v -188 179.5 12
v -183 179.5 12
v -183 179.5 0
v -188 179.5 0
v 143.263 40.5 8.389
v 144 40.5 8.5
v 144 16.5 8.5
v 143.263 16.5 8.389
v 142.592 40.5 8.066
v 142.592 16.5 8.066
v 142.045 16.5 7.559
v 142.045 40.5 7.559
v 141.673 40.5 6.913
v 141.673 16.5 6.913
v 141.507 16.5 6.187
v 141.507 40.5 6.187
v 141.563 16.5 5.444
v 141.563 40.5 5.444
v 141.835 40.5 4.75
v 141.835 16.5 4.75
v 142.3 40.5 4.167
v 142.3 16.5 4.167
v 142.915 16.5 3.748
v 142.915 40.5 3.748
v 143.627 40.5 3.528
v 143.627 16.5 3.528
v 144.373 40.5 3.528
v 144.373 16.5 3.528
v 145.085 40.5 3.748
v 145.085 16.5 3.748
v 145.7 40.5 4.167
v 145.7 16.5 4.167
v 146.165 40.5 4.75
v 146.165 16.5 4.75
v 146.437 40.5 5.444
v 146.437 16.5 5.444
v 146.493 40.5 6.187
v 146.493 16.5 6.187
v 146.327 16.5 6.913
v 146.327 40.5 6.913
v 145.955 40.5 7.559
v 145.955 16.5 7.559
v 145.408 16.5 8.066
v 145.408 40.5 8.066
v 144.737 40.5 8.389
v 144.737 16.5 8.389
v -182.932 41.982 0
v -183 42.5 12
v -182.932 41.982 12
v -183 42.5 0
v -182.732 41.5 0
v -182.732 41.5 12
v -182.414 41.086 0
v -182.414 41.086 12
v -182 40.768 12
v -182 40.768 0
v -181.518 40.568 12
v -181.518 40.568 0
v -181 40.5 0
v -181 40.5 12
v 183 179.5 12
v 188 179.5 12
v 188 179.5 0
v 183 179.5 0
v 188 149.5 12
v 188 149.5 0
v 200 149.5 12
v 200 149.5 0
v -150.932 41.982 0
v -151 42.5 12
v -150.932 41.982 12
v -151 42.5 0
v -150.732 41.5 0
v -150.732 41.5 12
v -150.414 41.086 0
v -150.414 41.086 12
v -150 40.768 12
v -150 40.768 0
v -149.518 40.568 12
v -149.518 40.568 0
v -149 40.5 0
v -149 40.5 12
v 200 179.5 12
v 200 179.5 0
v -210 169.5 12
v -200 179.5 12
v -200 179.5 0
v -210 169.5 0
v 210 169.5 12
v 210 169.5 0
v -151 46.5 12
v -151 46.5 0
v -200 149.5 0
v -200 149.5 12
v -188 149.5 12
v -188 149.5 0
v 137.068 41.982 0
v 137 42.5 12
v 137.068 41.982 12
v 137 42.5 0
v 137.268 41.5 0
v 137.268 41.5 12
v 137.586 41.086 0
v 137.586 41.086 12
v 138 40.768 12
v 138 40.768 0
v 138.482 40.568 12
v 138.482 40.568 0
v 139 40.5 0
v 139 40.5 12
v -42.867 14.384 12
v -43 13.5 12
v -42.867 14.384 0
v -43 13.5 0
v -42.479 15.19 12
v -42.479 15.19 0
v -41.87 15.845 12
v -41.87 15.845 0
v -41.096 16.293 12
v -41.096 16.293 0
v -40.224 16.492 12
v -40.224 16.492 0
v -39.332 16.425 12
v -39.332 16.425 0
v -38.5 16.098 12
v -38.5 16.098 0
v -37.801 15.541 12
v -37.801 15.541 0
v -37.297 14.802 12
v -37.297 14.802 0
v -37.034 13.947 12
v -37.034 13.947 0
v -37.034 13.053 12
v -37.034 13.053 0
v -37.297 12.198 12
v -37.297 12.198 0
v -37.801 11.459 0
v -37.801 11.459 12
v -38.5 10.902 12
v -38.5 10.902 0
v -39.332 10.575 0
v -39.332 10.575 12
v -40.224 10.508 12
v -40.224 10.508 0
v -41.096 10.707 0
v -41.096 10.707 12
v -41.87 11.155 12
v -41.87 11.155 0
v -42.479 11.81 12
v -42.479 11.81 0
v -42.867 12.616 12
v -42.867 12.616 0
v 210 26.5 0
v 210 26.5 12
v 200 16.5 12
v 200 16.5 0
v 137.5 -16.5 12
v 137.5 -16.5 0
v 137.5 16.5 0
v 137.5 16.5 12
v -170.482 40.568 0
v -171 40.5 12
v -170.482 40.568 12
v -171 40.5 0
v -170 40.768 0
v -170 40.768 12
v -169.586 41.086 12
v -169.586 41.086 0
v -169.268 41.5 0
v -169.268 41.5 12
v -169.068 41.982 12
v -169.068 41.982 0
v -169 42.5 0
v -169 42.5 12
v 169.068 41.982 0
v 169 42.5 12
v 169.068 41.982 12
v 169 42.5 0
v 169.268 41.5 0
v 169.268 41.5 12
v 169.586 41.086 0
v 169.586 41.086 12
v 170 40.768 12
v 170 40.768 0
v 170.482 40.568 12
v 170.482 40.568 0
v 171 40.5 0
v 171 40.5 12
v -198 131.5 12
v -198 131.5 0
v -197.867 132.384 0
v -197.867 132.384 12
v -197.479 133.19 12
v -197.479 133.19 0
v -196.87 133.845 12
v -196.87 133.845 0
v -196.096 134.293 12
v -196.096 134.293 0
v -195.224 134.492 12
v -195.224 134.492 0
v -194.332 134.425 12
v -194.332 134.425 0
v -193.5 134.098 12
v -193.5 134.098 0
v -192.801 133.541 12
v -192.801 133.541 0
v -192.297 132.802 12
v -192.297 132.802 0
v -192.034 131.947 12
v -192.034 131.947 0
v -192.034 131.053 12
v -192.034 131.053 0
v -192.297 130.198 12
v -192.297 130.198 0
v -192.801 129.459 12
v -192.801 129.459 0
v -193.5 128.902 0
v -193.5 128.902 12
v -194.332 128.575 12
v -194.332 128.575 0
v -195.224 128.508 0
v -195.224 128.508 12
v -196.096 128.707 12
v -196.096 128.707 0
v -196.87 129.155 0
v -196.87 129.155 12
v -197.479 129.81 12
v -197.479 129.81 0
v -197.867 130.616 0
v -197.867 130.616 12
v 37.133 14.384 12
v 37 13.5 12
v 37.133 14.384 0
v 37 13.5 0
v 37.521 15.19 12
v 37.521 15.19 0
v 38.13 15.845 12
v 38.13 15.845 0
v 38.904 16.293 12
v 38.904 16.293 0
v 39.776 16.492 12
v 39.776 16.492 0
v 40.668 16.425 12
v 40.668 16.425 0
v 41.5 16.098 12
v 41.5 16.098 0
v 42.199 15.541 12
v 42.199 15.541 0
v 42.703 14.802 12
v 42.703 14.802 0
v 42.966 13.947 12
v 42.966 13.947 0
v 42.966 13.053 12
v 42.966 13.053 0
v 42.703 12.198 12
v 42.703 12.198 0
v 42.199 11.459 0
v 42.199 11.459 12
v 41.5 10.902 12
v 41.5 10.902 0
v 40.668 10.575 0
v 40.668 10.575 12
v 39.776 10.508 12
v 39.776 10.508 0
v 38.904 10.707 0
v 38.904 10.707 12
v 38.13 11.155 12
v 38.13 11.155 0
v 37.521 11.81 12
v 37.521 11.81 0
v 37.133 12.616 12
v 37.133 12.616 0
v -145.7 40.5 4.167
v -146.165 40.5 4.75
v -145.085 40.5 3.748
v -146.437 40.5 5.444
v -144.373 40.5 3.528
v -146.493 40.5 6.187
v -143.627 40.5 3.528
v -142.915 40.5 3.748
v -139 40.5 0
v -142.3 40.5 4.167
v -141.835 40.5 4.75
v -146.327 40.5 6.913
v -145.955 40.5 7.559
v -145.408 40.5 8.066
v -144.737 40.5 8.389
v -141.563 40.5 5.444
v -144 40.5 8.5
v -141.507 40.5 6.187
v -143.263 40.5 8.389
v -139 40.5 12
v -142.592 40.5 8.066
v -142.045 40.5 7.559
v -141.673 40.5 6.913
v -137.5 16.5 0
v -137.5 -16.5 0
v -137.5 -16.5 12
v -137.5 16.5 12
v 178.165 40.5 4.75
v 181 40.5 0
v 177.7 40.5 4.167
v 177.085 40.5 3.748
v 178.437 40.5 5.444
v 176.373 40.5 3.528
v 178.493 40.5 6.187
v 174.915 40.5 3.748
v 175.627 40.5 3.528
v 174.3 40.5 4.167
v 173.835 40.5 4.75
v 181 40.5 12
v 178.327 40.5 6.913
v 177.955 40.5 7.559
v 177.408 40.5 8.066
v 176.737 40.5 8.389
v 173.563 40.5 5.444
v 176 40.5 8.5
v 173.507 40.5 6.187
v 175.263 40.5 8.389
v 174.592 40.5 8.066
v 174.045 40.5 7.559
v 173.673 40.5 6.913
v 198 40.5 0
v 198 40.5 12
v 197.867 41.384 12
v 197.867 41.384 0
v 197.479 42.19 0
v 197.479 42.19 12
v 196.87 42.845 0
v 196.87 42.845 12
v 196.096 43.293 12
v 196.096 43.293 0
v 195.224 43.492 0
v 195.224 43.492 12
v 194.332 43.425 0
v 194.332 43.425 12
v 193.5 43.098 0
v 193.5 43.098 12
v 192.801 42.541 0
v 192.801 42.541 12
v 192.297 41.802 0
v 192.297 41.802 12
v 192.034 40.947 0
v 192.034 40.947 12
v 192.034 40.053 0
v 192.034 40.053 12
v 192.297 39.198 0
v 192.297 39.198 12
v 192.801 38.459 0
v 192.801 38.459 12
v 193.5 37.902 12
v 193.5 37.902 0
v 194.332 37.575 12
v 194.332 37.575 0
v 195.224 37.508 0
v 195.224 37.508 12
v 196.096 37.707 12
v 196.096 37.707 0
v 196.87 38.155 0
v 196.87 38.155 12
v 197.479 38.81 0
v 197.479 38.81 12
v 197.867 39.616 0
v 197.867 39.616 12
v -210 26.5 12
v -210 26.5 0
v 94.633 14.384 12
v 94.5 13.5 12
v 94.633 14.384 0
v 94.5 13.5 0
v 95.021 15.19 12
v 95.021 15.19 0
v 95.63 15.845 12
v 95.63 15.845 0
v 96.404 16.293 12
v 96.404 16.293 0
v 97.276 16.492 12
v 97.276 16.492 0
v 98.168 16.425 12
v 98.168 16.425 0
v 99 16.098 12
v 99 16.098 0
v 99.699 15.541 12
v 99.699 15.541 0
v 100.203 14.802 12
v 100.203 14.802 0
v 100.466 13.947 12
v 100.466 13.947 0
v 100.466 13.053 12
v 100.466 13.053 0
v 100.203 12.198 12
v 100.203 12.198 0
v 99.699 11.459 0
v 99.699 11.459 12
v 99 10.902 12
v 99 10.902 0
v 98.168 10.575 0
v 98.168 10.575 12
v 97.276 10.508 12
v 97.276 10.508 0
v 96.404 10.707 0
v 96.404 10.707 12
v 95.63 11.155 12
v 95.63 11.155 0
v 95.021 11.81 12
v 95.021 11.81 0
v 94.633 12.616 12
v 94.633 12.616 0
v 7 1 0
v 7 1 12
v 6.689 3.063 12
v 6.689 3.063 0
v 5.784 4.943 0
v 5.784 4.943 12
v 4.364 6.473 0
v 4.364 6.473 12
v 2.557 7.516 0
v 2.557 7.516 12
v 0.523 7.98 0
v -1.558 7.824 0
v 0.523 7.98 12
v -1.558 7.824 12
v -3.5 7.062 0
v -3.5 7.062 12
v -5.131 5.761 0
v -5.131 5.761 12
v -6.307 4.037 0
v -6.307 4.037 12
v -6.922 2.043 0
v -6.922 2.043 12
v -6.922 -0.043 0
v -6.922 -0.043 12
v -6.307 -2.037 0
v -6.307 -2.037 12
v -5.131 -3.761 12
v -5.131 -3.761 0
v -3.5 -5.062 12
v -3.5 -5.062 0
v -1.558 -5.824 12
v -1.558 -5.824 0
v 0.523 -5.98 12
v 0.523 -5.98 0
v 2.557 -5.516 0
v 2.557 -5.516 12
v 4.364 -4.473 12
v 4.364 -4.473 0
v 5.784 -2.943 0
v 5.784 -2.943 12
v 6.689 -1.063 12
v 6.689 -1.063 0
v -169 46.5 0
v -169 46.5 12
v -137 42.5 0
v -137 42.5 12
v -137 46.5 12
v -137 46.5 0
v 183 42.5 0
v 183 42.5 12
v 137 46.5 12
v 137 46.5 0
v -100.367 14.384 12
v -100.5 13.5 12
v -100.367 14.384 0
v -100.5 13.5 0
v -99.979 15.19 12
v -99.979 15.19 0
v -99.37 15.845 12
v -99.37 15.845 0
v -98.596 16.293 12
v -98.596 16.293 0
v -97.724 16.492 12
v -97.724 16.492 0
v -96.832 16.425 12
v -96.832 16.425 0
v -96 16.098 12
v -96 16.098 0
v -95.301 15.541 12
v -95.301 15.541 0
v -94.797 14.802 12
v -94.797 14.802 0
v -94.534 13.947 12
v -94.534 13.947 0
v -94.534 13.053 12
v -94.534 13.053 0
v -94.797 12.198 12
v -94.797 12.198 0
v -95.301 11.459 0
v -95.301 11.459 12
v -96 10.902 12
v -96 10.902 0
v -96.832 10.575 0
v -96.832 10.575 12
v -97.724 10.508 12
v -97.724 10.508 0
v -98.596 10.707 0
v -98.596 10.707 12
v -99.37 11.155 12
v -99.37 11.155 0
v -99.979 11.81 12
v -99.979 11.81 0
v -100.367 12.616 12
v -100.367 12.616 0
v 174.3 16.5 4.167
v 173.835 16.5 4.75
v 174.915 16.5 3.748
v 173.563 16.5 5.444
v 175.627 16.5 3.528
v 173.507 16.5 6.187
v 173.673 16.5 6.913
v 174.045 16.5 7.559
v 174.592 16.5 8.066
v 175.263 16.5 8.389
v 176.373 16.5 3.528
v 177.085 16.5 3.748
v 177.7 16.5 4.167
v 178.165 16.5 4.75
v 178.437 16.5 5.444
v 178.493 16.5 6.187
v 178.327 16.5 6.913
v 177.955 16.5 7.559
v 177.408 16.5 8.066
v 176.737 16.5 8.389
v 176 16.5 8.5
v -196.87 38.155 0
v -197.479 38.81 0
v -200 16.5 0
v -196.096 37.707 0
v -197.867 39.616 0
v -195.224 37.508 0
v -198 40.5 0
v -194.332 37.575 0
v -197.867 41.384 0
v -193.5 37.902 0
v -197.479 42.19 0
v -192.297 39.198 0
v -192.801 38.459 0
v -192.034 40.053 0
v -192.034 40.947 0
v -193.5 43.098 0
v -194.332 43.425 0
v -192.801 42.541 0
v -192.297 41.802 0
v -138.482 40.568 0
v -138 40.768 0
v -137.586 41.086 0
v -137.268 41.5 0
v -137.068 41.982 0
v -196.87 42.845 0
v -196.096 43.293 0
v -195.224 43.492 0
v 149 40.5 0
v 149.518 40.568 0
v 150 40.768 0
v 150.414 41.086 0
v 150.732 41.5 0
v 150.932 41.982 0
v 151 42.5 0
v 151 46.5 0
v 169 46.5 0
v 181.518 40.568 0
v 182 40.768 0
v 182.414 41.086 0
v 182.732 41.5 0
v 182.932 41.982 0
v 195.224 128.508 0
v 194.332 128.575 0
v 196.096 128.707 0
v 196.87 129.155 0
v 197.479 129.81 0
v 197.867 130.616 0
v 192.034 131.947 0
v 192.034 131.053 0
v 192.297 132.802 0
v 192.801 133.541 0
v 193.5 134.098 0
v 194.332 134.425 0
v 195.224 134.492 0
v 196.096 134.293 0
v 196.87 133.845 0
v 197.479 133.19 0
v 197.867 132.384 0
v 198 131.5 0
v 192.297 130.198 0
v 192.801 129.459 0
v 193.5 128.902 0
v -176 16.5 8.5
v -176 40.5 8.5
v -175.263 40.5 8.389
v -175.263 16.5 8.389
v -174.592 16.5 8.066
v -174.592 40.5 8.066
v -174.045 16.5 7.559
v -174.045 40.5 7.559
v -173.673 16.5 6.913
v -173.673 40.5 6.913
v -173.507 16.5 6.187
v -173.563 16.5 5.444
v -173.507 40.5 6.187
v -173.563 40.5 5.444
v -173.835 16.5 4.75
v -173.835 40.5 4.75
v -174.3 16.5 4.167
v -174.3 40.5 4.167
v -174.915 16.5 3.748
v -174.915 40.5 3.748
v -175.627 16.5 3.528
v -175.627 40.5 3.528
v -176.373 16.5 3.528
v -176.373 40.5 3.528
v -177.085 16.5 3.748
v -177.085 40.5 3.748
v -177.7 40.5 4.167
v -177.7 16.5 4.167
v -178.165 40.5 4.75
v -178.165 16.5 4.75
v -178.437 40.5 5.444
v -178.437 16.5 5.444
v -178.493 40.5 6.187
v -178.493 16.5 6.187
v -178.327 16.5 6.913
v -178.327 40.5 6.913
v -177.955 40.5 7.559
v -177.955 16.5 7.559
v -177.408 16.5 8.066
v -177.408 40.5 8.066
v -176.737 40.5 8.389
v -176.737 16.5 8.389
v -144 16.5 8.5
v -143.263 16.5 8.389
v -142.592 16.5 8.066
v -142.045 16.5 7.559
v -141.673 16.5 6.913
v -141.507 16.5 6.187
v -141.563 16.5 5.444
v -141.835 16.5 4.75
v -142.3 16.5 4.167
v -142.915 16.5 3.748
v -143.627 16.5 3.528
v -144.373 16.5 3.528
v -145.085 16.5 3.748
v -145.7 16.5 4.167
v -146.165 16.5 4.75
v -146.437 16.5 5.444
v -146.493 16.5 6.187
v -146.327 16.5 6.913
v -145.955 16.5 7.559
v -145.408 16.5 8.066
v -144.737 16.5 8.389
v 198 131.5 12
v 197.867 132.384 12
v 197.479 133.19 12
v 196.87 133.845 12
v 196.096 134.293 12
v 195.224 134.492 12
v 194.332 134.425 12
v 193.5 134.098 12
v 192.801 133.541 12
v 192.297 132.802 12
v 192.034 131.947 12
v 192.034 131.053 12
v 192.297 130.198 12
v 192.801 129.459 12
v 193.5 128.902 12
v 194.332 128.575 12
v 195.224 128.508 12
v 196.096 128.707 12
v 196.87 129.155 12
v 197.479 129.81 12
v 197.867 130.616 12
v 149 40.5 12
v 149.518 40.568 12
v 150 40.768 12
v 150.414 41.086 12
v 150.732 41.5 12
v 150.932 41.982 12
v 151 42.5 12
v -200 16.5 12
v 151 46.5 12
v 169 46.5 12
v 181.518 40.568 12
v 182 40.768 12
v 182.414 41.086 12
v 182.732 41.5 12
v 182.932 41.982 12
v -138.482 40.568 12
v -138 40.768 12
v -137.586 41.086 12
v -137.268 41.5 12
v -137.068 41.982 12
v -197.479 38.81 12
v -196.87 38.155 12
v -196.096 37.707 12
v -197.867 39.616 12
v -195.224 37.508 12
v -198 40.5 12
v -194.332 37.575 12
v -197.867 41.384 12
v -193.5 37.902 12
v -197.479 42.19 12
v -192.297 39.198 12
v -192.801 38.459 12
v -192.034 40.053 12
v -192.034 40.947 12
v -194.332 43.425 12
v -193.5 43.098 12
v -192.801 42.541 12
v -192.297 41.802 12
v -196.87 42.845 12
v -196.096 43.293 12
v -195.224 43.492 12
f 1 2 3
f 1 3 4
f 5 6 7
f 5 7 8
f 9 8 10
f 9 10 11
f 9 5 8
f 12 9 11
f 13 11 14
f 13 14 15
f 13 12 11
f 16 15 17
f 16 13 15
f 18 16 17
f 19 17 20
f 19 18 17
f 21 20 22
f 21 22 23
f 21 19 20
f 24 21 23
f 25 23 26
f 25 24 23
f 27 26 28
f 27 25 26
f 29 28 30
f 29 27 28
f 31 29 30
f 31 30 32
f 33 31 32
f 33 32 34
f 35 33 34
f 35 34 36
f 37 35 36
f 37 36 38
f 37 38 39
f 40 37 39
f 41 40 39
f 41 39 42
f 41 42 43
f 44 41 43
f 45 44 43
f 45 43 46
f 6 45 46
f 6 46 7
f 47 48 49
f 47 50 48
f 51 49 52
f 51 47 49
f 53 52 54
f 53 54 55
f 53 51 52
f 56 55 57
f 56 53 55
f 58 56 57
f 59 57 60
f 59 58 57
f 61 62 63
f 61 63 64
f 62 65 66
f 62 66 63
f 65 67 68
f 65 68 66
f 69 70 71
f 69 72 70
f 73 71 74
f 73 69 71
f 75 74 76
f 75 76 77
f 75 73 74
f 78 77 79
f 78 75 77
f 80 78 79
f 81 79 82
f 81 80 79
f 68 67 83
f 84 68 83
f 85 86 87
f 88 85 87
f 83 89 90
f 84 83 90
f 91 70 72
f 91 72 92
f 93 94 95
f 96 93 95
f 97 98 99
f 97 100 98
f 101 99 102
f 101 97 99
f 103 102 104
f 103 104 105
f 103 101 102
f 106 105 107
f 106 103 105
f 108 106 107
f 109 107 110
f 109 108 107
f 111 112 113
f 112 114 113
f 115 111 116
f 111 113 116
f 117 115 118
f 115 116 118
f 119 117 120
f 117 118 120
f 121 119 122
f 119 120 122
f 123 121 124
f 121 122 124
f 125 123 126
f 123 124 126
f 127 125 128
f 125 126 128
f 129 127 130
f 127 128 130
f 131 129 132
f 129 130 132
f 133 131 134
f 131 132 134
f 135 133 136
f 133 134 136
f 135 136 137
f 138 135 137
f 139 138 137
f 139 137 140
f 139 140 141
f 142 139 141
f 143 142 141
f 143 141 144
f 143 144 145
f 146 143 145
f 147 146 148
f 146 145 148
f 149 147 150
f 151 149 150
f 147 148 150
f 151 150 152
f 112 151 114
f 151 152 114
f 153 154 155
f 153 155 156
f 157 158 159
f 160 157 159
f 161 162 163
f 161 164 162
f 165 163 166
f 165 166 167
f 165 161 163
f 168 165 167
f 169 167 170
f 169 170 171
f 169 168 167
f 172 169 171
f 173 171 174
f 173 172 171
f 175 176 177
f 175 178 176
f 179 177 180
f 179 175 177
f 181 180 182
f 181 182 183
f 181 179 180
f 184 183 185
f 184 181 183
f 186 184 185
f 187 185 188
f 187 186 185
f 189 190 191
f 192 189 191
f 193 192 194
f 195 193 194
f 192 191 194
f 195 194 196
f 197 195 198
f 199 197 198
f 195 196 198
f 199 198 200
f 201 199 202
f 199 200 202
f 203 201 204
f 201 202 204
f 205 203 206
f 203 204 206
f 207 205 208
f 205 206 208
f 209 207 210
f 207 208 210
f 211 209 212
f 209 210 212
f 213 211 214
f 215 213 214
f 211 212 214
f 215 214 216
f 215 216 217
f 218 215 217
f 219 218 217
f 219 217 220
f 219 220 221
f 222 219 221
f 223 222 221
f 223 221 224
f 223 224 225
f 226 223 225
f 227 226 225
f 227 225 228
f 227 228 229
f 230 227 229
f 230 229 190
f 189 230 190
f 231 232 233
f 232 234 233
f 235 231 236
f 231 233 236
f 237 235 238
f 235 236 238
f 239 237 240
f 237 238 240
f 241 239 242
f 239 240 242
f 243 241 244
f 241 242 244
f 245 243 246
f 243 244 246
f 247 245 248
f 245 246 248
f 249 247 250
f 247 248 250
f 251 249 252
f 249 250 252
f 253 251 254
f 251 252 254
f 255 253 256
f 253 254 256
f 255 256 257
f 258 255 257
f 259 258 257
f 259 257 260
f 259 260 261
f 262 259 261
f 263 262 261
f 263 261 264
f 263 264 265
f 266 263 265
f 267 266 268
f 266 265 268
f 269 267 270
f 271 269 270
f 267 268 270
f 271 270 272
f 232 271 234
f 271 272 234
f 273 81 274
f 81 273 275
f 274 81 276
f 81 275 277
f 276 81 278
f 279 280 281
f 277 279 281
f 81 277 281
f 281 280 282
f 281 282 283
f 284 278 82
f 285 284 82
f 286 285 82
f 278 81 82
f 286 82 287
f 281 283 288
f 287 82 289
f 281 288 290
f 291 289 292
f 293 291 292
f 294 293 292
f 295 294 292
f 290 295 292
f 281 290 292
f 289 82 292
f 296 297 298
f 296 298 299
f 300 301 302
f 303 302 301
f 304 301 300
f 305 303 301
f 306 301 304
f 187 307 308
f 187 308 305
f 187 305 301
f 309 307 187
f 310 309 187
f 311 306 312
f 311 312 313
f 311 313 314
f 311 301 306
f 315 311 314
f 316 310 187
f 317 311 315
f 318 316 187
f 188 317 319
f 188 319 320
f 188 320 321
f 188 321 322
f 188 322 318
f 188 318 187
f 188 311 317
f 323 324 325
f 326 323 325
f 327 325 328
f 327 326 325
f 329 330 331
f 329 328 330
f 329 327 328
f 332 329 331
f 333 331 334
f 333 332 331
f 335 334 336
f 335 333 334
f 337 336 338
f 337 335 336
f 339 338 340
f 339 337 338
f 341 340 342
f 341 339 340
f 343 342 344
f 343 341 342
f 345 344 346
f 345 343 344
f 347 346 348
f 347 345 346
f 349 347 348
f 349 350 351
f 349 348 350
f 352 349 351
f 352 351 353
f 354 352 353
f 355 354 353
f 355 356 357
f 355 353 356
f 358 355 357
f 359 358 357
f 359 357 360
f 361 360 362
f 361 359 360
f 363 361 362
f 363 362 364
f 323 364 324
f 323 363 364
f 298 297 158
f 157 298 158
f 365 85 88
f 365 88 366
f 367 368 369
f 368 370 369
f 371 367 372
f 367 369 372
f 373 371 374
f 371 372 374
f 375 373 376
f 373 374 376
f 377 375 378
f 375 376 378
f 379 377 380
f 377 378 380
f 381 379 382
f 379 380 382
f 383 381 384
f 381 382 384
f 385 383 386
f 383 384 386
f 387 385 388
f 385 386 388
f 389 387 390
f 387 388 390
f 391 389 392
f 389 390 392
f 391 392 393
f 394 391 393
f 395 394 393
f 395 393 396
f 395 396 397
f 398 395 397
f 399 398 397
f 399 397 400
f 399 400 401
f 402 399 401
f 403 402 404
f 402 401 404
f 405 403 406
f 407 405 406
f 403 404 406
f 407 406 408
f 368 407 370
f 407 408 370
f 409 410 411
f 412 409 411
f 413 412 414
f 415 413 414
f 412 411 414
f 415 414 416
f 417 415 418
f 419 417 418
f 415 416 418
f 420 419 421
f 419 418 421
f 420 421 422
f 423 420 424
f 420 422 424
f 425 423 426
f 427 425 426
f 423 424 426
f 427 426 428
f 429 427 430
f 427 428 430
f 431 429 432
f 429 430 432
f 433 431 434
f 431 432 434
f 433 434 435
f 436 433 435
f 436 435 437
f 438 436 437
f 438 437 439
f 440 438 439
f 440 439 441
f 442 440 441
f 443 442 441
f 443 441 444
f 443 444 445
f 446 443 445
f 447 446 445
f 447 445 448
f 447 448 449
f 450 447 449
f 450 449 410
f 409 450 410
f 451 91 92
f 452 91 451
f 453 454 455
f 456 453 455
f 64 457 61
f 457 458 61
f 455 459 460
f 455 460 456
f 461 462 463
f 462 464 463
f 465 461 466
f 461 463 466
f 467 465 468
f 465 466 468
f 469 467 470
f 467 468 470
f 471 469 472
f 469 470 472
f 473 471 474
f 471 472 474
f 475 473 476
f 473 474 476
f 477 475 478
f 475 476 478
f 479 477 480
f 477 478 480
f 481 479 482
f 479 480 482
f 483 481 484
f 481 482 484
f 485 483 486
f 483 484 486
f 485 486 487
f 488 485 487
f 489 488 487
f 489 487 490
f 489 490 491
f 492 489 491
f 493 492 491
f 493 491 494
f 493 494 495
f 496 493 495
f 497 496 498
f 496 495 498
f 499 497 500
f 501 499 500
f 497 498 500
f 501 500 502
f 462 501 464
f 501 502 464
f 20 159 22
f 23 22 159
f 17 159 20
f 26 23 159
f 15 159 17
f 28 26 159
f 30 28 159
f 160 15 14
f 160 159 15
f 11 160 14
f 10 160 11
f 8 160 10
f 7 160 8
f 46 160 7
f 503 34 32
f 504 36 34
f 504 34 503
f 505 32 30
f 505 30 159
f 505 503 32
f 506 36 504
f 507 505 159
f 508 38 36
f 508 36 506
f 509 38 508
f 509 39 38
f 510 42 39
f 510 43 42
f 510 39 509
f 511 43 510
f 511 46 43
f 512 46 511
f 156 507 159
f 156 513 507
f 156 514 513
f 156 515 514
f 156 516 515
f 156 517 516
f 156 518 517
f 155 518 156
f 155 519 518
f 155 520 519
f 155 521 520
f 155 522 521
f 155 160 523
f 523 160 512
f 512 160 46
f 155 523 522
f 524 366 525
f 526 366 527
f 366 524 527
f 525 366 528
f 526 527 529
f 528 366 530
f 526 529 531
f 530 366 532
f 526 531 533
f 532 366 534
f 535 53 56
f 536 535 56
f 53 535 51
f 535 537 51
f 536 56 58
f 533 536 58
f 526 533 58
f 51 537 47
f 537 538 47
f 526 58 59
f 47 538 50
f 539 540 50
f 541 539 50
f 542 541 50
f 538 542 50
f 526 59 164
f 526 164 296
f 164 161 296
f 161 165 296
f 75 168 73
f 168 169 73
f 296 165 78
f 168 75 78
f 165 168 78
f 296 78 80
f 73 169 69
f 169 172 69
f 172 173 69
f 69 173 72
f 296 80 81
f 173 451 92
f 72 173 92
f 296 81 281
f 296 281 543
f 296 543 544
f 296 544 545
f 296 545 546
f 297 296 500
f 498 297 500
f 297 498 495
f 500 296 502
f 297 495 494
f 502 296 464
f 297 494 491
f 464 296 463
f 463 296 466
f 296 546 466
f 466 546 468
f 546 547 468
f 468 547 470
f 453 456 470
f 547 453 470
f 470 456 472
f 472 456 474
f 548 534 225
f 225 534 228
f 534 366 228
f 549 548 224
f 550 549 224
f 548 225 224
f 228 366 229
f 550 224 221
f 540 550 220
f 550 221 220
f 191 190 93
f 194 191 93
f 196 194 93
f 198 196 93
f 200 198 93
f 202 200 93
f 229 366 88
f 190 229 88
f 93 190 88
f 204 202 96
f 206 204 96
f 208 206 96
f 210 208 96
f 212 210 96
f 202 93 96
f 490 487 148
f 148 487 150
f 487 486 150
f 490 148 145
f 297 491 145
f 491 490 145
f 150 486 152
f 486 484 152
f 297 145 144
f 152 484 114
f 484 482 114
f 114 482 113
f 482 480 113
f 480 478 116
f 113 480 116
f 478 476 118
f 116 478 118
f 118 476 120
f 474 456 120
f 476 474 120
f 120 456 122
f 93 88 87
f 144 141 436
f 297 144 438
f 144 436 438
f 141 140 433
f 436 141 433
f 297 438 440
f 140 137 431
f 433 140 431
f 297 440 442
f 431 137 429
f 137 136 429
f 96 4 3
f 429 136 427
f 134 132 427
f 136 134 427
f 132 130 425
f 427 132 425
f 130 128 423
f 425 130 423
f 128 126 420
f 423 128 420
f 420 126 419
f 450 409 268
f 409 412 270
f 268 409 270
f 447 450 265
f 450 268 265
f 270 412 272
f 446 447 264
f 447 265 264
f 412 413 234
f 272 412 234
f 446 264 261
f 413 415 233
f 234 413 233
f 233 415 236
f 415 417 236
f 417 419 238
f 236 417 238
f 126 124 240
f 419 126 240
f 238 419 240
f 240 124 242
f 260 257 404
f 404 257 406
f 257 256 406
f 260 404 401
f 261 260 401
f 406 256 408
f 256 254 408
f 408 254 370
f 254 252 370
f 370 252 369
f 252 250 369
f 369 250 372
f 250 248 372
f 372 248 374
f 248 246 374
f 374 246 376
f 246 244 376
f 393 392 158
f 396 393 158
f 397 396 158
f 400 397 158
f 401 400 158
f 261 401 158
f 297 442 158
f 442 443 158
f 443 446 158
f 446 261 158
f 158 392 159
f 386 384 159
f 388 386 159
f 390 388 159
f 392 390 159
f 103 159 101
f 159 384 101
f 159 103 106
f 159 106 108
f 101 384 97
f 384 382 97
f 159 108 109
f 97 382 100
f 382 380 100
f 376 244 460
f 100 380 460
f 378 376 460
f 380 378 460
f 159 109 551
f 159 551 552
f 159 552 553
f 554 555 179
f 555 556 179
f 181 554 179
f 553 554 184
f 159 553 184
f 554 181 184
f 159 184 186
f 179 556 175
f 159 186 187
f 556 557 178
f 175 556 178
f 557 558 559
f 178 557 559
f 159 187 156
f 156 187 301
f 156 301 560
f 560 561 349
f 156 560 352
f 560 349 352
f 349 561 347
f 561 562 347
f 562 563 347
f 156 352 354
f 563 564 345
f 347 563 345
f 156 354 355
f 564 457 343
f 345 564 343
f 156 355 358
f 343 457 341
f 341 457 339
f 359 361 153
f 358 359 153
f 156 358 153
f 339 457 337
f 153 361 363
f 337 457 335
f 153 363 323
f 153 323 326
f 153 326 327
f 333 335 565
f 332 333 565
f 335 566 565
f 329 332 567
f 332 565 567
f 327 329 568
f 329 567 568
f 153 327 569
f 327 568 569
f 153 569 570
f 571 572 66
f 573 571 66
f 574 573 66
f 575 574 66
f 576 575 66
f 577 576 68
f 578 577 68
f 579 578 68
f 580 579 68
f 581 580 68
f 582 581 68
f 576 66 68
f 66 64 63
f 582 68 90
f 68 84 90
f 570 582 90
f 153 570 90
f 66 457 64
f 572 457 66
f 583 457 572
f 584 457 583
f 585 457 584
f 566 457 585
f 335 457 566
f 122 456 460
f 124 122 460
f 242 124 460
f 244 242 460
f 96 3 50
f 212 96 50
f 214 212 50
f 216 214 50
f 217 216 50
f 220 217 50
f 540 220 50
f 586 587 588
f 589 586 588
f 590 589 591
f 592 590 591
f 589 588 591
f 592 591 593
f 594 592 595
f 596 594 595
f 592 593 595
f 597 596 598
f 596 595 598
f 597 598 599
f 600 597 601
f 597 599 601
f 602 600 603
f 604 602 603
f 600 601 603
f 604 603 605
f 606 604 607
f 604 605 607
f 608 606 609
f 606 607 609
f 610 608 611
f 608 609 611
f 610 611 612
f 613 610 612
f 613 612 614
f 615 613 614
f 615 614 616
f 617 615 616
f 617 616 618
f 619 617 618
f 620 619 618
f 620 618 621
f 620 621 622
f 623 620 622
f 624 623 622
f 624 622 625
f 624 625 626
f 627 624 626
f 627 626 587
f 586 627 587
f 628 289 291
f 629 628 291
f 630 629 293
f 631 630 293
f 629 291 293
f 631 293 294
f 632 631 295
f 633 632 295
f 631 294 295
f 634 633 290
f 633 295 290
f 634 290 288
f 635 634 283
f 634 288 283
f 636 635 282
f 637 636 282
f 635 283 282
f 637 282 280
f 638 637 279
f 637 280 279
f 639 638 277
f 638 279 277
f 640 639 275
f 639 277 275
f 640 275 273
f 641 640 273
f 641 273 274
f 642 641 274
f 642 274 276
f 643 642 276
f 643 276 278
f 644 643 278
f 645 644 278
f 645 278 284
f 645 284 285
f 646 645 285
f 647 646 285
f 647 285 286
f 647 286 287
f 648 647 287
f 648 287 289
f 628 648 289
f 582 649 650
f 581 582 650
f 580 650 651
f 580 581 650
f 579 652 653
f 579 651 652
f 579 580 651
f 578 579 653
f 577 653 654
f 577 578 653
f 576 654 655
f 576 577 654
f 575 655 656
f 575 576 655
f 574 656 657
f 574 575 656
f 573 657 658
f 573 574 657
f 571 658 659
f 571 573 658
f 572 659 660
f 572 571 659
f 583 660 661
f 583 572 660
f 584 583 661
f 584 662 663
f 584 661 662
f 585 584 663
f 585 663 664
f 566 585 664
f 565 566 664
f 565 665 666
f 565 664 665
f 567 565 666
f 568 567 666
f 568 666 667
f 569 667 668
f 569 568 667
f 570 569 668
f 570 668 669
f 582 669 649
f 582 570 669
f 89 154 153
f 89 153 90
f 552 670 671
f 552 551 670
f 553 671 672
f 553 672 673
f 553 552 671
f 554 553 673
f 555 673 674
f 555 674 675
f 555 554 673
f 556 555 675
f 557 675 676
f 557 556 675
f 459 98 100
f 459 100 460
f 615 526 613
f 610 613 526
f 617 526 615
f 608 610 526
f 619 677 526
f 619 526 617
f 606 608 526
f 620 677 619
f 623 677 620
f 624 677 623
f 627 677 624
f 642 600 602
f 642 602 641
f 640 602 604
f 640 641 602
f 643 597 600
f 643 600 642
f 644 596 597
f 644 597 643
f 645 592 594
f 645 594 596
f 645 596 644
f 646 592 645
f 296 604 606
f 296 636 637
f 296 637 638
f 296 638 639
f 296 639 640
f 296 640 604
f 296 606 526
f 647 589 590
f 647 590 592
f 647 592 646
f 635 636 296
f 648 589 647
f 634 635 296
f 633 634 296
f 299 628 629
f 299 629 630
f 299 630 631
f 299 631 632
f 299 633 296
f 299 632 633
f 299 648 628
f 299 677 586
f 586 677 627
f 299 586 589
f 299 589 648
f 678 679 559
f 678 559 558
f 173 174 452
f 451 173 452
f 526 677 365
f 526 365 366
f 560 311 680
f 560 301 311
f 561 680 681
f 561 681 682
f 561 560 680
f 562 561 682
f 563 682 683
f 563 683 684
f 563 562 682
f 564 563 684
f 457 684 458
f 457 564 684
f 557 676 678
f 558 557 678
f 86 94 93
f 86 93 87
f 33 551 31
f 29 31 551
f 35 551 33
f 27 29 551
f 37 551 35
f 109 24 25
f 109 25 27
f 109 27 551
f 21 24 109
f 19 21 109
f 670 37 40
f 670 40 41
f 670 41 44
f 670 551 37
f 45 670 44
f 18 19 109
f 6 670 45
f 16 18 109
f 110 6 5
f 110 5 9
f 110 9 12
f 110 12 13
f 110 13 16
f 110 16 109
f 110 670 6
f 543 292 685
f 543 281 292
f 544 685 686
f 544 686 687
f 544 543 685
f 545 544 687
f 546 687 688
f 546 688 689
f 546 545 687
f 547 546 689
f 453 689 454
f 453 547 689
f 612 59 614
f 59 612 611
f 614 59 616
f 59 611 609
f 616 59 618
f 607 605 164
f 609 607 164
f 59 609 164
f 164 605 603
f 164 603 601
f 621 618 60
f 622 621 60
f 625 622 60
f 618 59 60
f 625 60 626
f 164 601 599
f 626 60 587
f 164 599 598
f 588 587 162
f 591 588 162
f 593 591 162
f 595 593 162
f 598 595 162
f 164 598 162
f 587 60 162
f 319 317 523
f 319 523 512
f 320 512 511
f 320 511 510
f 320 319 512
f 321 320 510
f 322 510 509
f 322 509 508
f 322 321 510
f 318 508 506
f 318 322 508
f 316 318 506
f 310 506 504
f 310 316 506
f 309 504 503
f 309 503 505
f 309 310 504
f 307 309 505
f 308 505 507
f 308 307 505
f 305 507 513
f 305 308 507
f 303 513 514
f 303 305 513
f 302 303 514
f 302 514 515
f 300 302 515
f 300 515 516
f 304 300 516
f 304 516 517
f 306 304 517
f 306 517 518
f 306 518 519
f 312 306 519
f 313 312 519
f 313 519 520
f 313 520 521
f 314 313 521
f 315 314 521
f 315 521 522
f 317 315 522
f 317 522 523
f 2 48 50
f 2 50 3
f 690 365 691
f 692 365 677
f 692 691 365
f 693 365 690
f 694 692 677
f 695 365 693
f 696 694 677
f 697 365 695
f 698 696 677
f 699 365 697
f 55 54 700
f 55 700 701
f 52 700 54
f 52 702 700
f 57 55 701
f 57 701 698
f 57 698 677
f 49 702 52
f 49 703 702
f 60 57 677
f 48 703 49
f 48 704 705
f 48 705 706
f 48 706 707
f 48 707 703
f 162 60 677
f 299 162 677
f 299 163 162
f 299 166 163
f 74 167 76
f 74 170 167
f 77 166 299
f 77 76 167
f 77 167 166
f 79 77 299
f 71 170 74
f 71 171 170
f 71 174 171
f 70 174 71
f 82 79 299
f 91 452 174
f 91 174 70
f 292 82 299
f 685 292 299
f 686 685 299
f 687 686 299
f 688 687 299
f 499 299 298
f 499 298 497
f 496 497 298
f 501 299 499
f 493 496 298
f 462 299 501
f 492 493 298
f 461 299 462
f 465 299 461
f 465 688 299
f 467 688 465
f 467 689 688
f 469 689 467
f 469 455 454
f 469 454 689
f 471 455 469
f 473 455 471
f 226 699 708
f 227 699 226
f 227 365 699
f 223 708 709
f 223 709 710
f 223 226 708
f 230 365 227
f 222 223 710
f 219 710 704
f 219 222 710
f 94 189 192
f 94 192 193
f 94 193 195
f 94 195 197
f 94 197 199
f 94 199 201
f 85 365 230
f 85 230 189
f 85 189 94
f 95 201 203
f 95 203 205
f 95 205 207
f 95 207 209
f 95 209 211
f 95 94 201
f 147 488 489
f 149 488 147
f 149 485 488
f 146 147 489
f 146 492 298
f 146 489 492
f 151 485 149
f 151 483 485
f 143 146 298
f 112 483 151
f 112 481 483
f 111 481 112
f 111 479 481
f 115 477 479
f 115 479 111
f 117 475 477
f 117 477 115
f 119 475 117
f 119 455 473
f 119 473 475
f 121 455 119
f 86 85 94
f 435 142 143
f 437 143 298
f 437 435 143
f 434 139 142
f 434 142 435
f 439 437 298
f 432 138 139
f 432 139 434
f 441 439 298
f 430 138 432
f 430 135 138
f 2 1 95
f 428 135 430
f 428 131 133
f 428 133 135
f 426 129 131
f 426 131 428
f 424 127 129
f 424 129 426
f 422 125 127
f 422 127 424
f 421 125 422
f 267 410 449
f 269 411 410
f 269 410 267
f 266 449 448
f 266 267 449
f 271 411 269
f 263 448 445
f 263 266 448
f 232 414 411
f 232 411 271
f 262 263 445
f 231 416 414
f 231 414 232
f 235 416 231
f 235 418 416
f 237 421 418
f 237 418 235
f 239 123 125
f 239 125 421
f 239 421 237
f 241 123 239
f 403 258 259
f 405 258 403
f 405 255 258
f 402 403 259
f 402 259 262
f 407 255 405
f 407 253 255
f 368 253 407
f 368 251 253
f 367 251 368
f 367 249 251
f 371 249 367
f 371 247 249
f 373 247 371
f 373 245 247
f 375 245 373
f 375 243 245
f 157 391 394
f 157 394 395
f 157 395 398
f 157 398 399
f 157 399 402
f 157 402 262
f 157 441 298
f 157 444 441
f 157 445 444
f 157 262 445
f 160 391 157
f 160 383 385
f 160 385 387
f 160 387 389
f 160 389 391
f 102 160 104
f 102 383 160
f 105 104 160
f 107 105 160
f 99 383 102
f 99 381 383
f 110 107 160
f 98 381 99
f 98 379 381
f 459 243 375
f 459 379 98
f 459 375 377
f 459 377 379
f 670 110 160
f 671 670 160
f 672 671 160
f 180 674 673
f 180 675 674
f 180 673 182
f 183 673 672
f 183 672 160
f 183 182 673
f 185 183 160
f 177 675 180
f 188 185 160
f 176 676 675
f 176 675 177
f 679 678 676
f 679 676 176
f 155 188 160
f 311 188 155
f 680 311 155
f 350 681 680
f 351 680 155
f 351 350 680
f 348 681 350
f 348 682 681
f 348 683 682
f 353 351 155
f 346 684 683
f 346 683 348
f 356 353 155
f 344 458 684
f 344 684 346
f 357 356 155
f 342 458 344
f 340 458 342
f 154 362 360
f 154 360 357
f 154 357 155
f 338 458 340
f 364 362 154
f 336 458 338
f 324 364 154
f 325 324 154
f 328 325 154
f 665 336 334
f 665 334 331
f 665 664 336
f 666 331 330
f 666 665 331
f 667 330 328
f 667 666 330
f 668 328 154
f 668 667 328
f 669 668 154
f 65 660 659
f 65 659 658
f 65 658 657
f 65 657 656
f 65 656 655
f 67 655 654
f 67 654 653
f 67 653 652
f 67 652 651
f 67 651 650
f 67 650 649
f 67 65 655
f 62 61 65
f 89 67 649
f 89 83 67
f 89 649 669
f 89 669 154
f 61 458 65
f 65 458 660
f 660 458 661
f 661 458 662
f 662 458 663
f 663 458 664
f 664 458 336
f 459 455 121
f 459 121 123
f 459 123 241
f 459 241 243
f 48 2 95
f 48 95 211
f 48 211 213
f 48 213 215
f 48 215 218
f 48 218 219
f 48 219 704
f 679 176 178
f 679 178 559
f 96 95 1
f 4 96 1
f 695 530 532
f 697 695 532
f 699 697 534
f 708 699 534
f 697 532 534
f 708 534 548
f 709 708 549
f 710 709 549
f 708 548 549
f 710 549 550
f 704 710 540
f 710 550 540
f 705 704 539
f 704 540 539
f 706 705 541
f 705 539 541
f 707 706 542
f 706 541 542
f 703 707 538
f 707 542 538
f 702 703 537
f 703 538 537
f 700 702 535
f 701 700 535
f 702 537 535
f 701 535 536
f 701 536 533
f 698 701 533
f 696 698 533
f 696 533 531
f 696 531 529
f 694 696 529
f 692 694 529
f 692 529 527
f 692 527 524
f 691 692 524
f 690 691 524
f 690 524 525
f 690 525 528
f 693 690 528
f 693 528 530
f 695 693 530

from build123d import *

# Parameters (mm, degrees)
SKETCH1_W                    = 275
SKETCH1_H                    = 33
BOSS_EXTRUDE1_DEPTH          = 12
CUT_EXTRUDE1_REACH           = 141.005
SKETCH2_R                    = 7
BOSS_EXTRUDE2_DEPTH          = 12
CUT_EXTRUDE2_REACH           = 250.863
SKETCH4_R                    = 2.5
CUT_EXTRUDE3_REACH           = 278.522
SKETCH5_W                    = 14
SKETCH5_H                    = 6
FILLET1_R                    = 2
FILLET1_OF_MIRROR2_R         = 2
CHAMFER1_SIZE                = 10
CUT_EXTRUDE4_REACH           = 278.522
SKETCH6_W                    = 12
SKETCH6_H                    = 30
CHAMFER2_SIZE                = 10
F_6_0_6_DIAMETER_HOLE1_D     = 6
F_6_0_6_DIAMETER_HOLE2_D     = 6
F_6_0_6_DIAMETER_HOLE2_DEPTH = 12
F_6_0_6_DIAMETER_HOLE2_TIP   = 1.802581857


with BuildPart() as part:
    # Sketch1 → Boss-Extrude1 (new body)
    with BuildSketch(Plane.XY):
        Rectangle(SKETCH1_W, SKETCH1_H)
    extrude(amount=BOSS_EXTRUDE1_DEPTH)

    # Sketch2 → Cut-Extrude1 (cut, up to next)
    with BuildSketch(Plane.XY.offset(12), mode=Mode.PRIVATE) as cut_extrude1_sk1:
        with Locations((0, 1)):
            Circle(SKETCH2_R)
    cut_extrude1_tool1 = extrude(cut_extrude1_sk1.sketch, amount=-CUT_EXTRUDE1_REACH, mode=Mode.PRIVATE) & part.part
    add(cut_extrude1_tool1.solids().sort_by_distance((0, 1, 12))[0], mode=Mode.SUBTRACT)

    # Sketch3 → Boss-Extrude2 (add)
    with BuildSketch(Plane.XY.offset(12)):
        Polygon((-210, 16.5), (210, 16.5), (210, 179.5), (183, 179.5), (183, 46.5), (-183, 46.5), (-183, 179.5), (-210, 179.5), align=None)
    extrude(amount=-BOSS_EXTRUDE2_DEPTH)

    # Sketch4 → Cut-Extrude2 (cut, up to next)
    with BuildSketch(Plane(origin=(0, 46.5, 0), x_dir=(1, 0, 0), z_dir=(0, 1, 0)), mode=Mode.PRIVATE) as cut_extrude2_sk1:
        with Locations(Location((-144, -6, 0), (0, 0, 270))):
            Circle(SKETCH4_R)
    cut_extrude2_tool1 = extrude(cut_extrude2_sk1.sketch, amount=-CUT_EXTRUDE2_REACH, mode=Mode.PRIVATE) & part.part
    # Sketch4 → Cut-Extrude2 (cut, up to next)
    with BuildSketch(Plane(origin=(0, 46.5, 0), x_dir=(1, 0, 0), z_dir=(0, 1, 0)), mode=Mode.PRIVATE) as cut_extrude2_sk2:
        with Locations(Location((-176, -6, 0), (0, 0, 270))):
            Circle(SKETCH4_R)
    cut_extrude2_tool2 = extrude(cut_extrude2_sk2.sketch, amount=-CUT_EXTRUDE2_REACH, mode=Mode.PRIVATE) & part.part
    cut_extrude2_1 = cut_extrude2_tool1.solids().sort_by_distance((-144, 46.5, 6))[0]
    add(cut_extrude2_1, mode=Mode.SUBTRACT)
    cut_extrude2_2 = cut_extrude2_tool2.solids().sort_by_distance((-176, 46.5, 6))[0]
    add(cut_extrude2_2, mode=Mode.SUBTRACT)
    cut_extrude2 = cut_extrude2_1 + cut_extrude2_2  # Cut-Extrude2 as one shape, for the pattern or mirror that repeats it

    # Mirror1: Cut-Extrude2 across plane
    add(cut_extrude2.mirror(Plane(origin=(0, 0, 0), x_dir=(0, 0, 1), z_dir=(1, 0, 0))), mode=Mode.SUBTRACT)

    # Sketch5 → Cut-Extrude3 (cut, up to next)
    with BuildSketch(Plane.XY.offset(12), mode=Mode.PRIVATE) as cut_extrude3_sk1:
        with Locations((-176, 43.5)):
            Rectangle(SKETCH5_W, SKETCH5_H)
    cut_extrude3_tool1 = extrude(cut_extrude3_sk1.sketch, amount=-CUT_EXTRUDE3_REACH, mode=Mode.PRIVATE) & part.part
    # Sketch5 → Cut-Extrude3 (cut, up to next)
    with BuildSketch(Plane.XY.offset(12), mode=Mode.PRIVATE) as cut_extrude3_sk2:
        with Locations((-144, 43.5)):
            Rectangle(SKETCH5_W, SKETCH5_H)
    cut_extrude3_tool2 = extrude(cut_extrude3_sk2.sketch, amount=-CUT_EXTRUDE3_REACH, mode=Mode.PRIVATE) & part.part
    cut_extrude3_1 = cut_extrude3_tool1.solids().sort_by_distance((-176, 43.5, 12))[0]
    add(cut_extrude3_1, mode=Mode.SUBTRACT)
    cut_extrude3_2 = cut_extrude3_tool2.solids().sort_by_distance((-144, 43.5, 12))[0]
    add(cut_extrude3_2, mode=Mode.SUBTRACT)
    cut_extrude3 = cut_extrude3_1 + cut_extrude3_2  # Cut-Extrude3 as one shape, for the pattern or mirror that repeats it

    # Fillet1
    fillet1_edges = [part.edges().sort_by_distance(p)[0] for p in [
        (-169, 40.5, 6),
        (-183, 40.5, 6),
        (-137, 40.5, 6),
        (-151, 40.5, 6),
    ]]
    fillet(fillet1_edges, radius=FILLET1_R)

    # Mirror2: Cut-Extrude3 across plane
    add(cut_extrude3.mirror(Plane(origin=(0, 0, 0), x_dir=(0, 0, 1), z_dir=(1, 0, 0))), mode=Mode.SUBTRACT)

    # Fillet1 of Mirror2
    fillet1_of_mirror2_edges = [part.edges().sort_by_distance(p)[0] for p in [
        (169, 40.5, 6),
        (183, 40.5, 6),
        (137, 40.5, 6),
        (151, 40.5, 6),
    ]]
    fillet(fillet1_of_mirror2_edges, radius=FILLET1_OF_MIRROR2_R)

    # Chamfer1
    chamfer1_edges = [part.edges().sort_by_distance(p)[0] for p in [
        (210, 16.5, 6),
        (-210, 16.5, 6),
    ]]
    chamfer(chamfer1_edges, length=CHAMFER1_SIZE)

    # Sketch6 → Cut-Extrude4 (cut, up to next)
    with BuildSketch(Plane.XY.offset(12), mode=Mode.PRIVATE) as cut_extrude4_sk1:
        with Locations((-194, 164.5)):
            Rectangle(SKETCH6_W, SKETCH6_H)
    cut_extrude4_tool1 = extrude(cut_extrude4_sk1.sketch, amount=-CUT_EXTRUDE4_REACH, mode=Mode.PRIVATE) & part.part
    cut_extrude4 = cut_extrude4_tool1.solids().sort_by_distance((-194, 164.5, 12))[0]
    add(cut_extrude4, mode=Mode.SUBTRACT)

    # Mirror3: Cut-Extrude4 across plane
    add(cut_extrude4.mirror(Plane(origin=(0, 0, 0), x_dir=(0, 0, 1), z_dir=(1, 0, 0))), mode=Mode.SUBTRACT)

    # Chamfer2
    chamfer2_edges = [part.edges().sort_by_distance(p)[0] for p in [
        (210, 179.5, 6),
        (-210, 179.5, 6),
    ]]
    chamfer(chamfer2_edges, length=CHAMFER2_SIZE - 0.0001)  # a hair under: the kernel refuses the full size

    # Ø6.0 (6) Diameter Hole1 (through all)
    with Locations(Plane.XY.offset(12)):
        with Locations((-195, 40.5), (-195, 131.5)):
            f_6_0_6_diameter_hole1 = Hole(F_6_0_6_DIAMETER_HOLE1_D / 2)

    # Mirror4: Ø6.0 (6) Diameter Hole1 across plane
    add(f_6_0_6_diameter_hole1.mirror(Plane(origin=(0, 0, 0), x_dir=(0, 0, 1), z_dir=(1, 0, 0))), mode=Mode.SUBTRACT)

    # Ø6.0 (6) Diameter Hole2
    with Locations(Plane.XY.offset(12)):
        with Locations((-97.5, 13.5), (-40, 13.5), (40, 13.5), (97.5, 13.5)):
            Hole(F_6_0_6_DIAMETER_HOLE2_D / 2, depth=F_6_0_6_DIAMETER_HOLE2_DEPTH)
            with Locations((0, 0, -(F_6_0_6_DIAMETER_HOLE2_DEPTH + F_6_0_6_DIAMETER_HOLE2_TIP / 2))):  # 118° drill point
                Cone(0, F_6_0_6_DIAMETER_HOLE2_D / 2, F_6_0_6_DIAMETER_HOLE2_TIP, mode=Mode.SUBTRACT)


solid = part.part
